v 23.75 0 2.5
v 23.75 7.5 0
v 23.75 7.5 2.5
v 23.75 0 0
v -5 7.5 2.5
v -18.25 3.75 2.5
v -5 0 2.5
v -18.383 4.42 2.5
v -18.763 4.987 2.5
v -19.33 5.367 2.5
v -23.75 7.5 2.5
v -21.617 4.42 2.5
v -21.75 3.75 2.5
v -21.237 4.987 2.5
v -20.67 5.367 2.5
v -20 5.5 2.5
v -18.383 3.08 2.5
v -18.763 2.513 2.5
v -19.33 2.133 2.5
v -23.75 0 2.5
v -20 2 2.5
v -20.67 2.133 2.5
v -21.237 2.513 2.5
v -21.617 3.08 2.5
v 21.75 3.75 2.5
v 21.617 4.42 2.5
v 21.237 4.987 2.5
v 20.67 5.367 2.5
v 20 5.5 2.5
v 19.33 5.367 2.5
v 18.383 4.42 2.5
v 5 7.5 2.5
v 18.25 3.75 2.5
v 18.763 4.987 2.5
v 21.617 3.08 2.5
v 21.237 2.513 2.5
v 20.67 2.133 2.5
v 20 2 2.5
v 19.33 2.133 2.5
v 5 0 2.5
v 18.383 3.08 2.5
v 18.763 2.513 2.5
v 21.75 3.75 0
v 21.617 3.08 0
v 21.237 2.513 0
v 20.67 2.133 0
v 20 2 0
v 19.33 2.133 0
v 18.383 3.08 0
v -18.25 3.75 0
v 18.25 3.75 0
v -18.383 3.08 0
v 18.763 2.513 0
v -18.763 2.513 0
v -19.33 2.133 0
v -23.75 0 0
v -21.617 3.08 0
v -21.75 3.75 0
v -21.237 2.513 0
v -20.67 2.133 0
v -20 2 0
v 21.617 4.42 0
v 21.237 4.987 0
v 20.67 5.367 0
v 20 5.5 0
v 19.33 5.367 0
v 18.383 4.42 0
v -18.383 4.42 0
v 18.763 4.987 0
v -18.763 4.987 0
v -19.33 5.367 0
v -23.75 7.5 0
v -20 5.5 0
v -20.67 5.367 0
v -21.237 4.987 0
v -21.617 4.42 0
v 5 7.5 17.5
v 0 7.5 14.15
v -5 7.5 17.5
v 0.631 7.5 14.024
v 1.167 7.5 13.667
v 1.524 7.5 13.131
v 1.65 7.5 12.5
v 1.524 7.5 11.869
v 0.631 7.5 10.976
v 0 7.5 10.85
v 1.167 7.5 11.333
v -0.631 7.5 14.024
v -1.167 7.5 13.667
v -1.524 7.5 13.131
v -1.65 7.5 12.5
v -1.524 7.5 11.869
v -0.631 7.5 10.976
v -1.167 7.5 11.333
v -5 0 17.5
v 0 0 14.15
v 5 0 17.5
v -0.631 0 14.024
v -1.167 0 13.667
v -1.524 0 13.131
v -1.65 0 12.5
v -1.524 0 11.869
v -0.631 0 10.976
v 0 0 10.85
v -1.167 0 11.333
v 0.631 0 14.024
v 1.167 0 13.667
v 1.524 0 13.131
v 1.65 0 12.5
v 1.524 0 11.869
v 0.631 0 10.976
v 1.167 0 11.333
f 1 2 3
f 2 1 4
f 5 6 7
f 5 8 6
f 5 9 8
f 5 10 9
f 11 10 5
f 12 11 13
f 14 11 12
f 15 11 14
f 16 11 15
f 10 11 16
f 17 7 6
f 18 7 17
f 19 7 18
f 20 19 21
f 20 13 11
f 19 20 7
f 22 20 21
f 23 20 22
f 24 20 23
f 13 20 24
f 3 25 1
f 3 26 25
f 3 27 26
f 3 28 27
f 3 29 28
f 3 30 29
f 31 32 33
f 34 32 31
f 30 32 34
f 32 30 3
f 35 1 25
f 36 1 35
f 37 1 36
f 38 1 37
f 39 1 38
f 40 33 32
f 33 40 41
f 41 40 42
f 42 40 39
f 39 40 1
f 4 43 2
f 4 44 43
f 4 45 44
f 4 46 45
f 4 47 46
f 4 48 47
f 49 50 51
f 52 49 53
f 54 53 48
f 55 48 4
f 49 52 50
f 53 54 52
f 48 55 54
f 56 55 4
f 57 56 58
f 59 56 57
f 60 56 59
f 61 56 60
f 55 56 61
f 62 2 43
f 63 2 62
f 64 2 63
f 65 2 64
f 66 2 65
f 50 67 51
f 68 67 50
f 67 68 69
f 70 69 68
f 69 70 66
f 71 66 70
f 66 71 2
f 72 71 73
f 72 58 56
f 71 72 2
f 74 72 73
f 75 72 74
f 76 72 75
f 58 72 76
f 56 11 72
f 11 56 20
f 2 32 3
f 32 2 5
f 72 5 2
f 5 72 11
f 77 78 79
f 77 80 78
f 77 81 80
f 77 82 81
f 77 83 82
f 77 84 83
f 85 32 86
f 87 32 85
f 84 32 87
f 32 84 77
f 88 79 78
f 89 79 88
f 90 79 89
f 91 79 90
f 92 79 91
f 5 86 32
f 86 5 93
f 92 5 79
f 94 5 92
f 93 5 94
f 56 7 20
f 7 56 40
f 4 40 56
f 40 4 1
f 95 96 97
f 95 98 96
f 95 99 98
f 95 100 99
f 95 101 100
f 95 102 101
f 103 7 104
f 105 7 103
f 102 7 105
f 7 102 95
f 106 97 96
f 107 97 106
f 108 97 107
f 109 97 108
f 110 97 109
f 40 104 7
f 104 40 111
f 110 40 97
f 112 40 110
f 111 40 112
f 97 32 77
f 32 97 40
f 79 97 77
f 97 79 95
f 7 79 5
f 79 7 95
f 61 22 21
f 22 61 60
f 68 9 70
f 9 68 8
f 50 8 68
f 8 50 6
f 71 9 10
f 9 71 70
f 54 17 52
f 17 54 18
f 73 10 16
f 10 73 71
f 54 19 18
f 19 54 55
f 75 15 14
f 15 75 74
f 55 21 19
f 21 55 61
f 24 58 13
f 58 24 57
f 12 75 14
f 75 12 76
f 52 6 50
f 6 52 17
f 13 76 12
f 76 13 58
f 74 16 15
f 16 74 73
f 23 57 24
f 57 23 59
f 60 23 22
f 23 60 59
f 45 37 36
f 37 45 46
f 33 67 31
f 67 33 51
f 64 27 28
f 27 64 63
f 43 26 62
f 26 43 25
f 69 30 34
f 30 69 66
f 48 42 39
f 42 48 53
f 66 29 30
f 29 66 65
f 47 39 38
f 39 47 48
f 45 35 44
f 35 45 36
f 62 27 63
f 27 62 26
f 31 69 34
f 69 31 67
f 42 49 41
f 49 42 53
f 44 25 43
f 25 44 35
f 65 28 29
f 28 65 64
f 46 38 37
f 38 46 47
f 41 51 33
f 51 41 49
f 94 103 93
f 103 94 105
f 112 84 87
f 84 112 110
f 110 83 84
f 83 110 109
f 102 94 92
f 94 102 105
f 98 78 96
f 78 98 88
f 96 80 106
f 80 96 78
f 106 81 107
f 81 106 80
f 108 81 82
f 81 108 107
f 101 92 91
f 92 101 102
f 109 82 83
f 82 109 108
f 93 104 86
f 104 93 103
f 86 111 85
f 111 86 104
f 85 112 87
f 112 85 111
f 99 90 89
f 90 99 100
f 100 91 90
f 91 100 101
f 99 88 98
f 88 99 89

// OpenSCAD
// file: ../parameters.scad
/*
  Useful settings/parameters for the OpenFlexure fibre stage
*/
version_numstring = "0.2.1";
stage = [37,20,5]; // dimensions of stage part
beam_height = 75; // height of beam above the table
stage_to_beam_height = 12.5;
stage_height = beam_height - stage_to_beam_height; //bottom of base to top surface of the stage 
 // NB platform_z sets the distance from bottom of the body to top of the stage
 // stage_height determines the thickness of the base.
brim_r = 0;

// Range of travel is lever length * flex_a
xy_lever = 10;
z_lever = 10;

// Mechanical reduction settings
xy_stage_reduction = 30/xy_lever; //ratio of sample motion to lower shelf motion
xy_reduction = 50/xy_lever; //mechanical reduction from screw to sample
z_reduction = 50/z_lever; //mechanical reduction for Z

// Motor lugs
motor_lugs = true;

// Mounting holes
breadboard_lugs="diagonal"; //sets the hole pattern for bolting it down.  See the options below.

// Flexure dimensions - good for PLA and ~0.5mm nozzle
zflex = [6, 1.5, 0.75]; //dimensions of flexure
xflex = [5,5.5,5]; //default bounding box of x flexure
xflex_t = 1; //thickness of bendy bit in x
flex_a = 0.1; //angle through which flexures are bent, radians
dz = 0.5; //thickness before a bridge is printable-on

xy_travel = xy_lever * flex_a; //max. travel in X or Y
xy_bottom_travel = xy_travel * xy_stage_reduction; //travel of bottom of XY stage
xy_actuator_pivot_w = 25; //width of the hinge for the actuating lever
actuator_h = 26; //height of actuator columns (~screw length)

pushstick = [5,38,5]; //cross-section of XY "push stick"
pw = pushstick[0]; //because this is used in a lot of places...

wall_t = 1.6;
d=0.05;

// Height of the bridging "shelves" in the XY axis "table" structure
shelf_z1 = xy_lever * xy_stage_reduction;
shelf_z2 = shelf_z1 + xy_lever;

// Z axis geometry
z_travel = z_lever * flex_a; //max. travel in Z
z_stage_base_y = -stage[1]/2-xy_bottom_travel; //position of the flexure edge of the Z stage
z_stage_base_w = stage[0] + 2*zflex[1] - 2*xy_bottom_travel - 2; //width of the flexure edge of the Z stage
z_anchor_bottom_y = z_stage_base_y - z_lever - zflex[1]; // lower Z stage end of the fixed base
z_actuator_pivot_y = stage[1]/2 + zflex[1] + zflex[0] + xy_bottom_travel + wall_t;
z_actuator_pivot_w = 20; //width of the hinge for the Z actuator lever
z_pushstick_z = shelf_z1 - pw - 2.5; // height of the Z pushstick

// Mounting stuff
// By default, place 3 mounting holes to align the centre of the stage with a hole.
// setting beam_between_holes adds another set of holes, putting the beam halfway between
bolt_spacing = 25; // change to 25.4 for imperial tables
mounting_bolts_alongholes = [[-1,0,0],[0,-1,0],[1,0,0]]*1.5*bolt_spacing; //beam aligned with holes
mounting_bolts_betweenholes = [[-1.25,-0.25,0],[1.25,0.25,0],[-0.25,-1.25,0]]*1.41*bolt_spacing;
mounting_bolts_atsides = [[-1.5,0,0],[1.5,0,0],[-1.5,-1,0],[1.5,-1,0]] * bolt_spacing;
mounting_bolts_diagonal = concat(mounting_bolts_alongholes, 
                                 mounting_bolts_betweenholes);
// I hope you'll excuse the stacked ternaries, this is an unpleasant necessity :(
mounting_bolts = breadboard_lugs=="atsides"?mounting_bolts_sides:
                 breadboard_lugs=="diagonal"?mounting_bolts_diagonal:
                 breadboard_lugs=="alongholes"?mounting_bolts_alongholes:
                 breadboard_lugs=="betweenholes"?mounting_bolts_betweenholes:
                 /*breadboard_lugs=="none"?*/[];
            
platform_z = shelf_z2 + stage[2] + 7; // The platform is a fixed height above the moving stage
fixed_platform_standoff = 10;
fixed_platform = [50,40,4];
platform_gap = xy_travel + 1;
casing_top = shelf_z2 + stage[2] - z_travel; // top of the wall
max_actuator_travel = max(xy_travel*xy_reduction, z_travel*z_reduction); // maximum distance the actuators protrude below the stage
base_height = stage_height - platform_z; // the base takes up any height not use by the body.
if(base_height < max_actuator_travel + 4) echo("WARNING: stage_height is too low, base will not compile properly!");
// main file
/*

An adapter to fit an LED behind a vertical microscope slide

TODO: locate the SCAD source file for the vertical slide clips!

(c) 2017 Richard Bowman - released under CERN Open Hardware License

*/

use <../utilities.scad>;
include <../parameters.scad>;

hole_sep = 40;
hole_d = 3.5;
beam_h = stage_to_beam_height;
d = 0.05;

w = hole_sep + hole_d + 4;
t = hole_d+4;
$fn=16;

difference(){
    union(){
        translate([-w/2,0,0]) cube([w,t,2.5]); //mounts to two holes
        translate([-10/2,0,0]) cube([10,t,beam_h+5]);
    }
    
    reflect([1,0,0]) translate([-hole_sep/2,t/2,-1]) cylinder(d=hole_d,h=999);
    translate([0,-99,beam_h]) rotate([-90,0,0]) cylinder(d=3.3, h=999);

}
